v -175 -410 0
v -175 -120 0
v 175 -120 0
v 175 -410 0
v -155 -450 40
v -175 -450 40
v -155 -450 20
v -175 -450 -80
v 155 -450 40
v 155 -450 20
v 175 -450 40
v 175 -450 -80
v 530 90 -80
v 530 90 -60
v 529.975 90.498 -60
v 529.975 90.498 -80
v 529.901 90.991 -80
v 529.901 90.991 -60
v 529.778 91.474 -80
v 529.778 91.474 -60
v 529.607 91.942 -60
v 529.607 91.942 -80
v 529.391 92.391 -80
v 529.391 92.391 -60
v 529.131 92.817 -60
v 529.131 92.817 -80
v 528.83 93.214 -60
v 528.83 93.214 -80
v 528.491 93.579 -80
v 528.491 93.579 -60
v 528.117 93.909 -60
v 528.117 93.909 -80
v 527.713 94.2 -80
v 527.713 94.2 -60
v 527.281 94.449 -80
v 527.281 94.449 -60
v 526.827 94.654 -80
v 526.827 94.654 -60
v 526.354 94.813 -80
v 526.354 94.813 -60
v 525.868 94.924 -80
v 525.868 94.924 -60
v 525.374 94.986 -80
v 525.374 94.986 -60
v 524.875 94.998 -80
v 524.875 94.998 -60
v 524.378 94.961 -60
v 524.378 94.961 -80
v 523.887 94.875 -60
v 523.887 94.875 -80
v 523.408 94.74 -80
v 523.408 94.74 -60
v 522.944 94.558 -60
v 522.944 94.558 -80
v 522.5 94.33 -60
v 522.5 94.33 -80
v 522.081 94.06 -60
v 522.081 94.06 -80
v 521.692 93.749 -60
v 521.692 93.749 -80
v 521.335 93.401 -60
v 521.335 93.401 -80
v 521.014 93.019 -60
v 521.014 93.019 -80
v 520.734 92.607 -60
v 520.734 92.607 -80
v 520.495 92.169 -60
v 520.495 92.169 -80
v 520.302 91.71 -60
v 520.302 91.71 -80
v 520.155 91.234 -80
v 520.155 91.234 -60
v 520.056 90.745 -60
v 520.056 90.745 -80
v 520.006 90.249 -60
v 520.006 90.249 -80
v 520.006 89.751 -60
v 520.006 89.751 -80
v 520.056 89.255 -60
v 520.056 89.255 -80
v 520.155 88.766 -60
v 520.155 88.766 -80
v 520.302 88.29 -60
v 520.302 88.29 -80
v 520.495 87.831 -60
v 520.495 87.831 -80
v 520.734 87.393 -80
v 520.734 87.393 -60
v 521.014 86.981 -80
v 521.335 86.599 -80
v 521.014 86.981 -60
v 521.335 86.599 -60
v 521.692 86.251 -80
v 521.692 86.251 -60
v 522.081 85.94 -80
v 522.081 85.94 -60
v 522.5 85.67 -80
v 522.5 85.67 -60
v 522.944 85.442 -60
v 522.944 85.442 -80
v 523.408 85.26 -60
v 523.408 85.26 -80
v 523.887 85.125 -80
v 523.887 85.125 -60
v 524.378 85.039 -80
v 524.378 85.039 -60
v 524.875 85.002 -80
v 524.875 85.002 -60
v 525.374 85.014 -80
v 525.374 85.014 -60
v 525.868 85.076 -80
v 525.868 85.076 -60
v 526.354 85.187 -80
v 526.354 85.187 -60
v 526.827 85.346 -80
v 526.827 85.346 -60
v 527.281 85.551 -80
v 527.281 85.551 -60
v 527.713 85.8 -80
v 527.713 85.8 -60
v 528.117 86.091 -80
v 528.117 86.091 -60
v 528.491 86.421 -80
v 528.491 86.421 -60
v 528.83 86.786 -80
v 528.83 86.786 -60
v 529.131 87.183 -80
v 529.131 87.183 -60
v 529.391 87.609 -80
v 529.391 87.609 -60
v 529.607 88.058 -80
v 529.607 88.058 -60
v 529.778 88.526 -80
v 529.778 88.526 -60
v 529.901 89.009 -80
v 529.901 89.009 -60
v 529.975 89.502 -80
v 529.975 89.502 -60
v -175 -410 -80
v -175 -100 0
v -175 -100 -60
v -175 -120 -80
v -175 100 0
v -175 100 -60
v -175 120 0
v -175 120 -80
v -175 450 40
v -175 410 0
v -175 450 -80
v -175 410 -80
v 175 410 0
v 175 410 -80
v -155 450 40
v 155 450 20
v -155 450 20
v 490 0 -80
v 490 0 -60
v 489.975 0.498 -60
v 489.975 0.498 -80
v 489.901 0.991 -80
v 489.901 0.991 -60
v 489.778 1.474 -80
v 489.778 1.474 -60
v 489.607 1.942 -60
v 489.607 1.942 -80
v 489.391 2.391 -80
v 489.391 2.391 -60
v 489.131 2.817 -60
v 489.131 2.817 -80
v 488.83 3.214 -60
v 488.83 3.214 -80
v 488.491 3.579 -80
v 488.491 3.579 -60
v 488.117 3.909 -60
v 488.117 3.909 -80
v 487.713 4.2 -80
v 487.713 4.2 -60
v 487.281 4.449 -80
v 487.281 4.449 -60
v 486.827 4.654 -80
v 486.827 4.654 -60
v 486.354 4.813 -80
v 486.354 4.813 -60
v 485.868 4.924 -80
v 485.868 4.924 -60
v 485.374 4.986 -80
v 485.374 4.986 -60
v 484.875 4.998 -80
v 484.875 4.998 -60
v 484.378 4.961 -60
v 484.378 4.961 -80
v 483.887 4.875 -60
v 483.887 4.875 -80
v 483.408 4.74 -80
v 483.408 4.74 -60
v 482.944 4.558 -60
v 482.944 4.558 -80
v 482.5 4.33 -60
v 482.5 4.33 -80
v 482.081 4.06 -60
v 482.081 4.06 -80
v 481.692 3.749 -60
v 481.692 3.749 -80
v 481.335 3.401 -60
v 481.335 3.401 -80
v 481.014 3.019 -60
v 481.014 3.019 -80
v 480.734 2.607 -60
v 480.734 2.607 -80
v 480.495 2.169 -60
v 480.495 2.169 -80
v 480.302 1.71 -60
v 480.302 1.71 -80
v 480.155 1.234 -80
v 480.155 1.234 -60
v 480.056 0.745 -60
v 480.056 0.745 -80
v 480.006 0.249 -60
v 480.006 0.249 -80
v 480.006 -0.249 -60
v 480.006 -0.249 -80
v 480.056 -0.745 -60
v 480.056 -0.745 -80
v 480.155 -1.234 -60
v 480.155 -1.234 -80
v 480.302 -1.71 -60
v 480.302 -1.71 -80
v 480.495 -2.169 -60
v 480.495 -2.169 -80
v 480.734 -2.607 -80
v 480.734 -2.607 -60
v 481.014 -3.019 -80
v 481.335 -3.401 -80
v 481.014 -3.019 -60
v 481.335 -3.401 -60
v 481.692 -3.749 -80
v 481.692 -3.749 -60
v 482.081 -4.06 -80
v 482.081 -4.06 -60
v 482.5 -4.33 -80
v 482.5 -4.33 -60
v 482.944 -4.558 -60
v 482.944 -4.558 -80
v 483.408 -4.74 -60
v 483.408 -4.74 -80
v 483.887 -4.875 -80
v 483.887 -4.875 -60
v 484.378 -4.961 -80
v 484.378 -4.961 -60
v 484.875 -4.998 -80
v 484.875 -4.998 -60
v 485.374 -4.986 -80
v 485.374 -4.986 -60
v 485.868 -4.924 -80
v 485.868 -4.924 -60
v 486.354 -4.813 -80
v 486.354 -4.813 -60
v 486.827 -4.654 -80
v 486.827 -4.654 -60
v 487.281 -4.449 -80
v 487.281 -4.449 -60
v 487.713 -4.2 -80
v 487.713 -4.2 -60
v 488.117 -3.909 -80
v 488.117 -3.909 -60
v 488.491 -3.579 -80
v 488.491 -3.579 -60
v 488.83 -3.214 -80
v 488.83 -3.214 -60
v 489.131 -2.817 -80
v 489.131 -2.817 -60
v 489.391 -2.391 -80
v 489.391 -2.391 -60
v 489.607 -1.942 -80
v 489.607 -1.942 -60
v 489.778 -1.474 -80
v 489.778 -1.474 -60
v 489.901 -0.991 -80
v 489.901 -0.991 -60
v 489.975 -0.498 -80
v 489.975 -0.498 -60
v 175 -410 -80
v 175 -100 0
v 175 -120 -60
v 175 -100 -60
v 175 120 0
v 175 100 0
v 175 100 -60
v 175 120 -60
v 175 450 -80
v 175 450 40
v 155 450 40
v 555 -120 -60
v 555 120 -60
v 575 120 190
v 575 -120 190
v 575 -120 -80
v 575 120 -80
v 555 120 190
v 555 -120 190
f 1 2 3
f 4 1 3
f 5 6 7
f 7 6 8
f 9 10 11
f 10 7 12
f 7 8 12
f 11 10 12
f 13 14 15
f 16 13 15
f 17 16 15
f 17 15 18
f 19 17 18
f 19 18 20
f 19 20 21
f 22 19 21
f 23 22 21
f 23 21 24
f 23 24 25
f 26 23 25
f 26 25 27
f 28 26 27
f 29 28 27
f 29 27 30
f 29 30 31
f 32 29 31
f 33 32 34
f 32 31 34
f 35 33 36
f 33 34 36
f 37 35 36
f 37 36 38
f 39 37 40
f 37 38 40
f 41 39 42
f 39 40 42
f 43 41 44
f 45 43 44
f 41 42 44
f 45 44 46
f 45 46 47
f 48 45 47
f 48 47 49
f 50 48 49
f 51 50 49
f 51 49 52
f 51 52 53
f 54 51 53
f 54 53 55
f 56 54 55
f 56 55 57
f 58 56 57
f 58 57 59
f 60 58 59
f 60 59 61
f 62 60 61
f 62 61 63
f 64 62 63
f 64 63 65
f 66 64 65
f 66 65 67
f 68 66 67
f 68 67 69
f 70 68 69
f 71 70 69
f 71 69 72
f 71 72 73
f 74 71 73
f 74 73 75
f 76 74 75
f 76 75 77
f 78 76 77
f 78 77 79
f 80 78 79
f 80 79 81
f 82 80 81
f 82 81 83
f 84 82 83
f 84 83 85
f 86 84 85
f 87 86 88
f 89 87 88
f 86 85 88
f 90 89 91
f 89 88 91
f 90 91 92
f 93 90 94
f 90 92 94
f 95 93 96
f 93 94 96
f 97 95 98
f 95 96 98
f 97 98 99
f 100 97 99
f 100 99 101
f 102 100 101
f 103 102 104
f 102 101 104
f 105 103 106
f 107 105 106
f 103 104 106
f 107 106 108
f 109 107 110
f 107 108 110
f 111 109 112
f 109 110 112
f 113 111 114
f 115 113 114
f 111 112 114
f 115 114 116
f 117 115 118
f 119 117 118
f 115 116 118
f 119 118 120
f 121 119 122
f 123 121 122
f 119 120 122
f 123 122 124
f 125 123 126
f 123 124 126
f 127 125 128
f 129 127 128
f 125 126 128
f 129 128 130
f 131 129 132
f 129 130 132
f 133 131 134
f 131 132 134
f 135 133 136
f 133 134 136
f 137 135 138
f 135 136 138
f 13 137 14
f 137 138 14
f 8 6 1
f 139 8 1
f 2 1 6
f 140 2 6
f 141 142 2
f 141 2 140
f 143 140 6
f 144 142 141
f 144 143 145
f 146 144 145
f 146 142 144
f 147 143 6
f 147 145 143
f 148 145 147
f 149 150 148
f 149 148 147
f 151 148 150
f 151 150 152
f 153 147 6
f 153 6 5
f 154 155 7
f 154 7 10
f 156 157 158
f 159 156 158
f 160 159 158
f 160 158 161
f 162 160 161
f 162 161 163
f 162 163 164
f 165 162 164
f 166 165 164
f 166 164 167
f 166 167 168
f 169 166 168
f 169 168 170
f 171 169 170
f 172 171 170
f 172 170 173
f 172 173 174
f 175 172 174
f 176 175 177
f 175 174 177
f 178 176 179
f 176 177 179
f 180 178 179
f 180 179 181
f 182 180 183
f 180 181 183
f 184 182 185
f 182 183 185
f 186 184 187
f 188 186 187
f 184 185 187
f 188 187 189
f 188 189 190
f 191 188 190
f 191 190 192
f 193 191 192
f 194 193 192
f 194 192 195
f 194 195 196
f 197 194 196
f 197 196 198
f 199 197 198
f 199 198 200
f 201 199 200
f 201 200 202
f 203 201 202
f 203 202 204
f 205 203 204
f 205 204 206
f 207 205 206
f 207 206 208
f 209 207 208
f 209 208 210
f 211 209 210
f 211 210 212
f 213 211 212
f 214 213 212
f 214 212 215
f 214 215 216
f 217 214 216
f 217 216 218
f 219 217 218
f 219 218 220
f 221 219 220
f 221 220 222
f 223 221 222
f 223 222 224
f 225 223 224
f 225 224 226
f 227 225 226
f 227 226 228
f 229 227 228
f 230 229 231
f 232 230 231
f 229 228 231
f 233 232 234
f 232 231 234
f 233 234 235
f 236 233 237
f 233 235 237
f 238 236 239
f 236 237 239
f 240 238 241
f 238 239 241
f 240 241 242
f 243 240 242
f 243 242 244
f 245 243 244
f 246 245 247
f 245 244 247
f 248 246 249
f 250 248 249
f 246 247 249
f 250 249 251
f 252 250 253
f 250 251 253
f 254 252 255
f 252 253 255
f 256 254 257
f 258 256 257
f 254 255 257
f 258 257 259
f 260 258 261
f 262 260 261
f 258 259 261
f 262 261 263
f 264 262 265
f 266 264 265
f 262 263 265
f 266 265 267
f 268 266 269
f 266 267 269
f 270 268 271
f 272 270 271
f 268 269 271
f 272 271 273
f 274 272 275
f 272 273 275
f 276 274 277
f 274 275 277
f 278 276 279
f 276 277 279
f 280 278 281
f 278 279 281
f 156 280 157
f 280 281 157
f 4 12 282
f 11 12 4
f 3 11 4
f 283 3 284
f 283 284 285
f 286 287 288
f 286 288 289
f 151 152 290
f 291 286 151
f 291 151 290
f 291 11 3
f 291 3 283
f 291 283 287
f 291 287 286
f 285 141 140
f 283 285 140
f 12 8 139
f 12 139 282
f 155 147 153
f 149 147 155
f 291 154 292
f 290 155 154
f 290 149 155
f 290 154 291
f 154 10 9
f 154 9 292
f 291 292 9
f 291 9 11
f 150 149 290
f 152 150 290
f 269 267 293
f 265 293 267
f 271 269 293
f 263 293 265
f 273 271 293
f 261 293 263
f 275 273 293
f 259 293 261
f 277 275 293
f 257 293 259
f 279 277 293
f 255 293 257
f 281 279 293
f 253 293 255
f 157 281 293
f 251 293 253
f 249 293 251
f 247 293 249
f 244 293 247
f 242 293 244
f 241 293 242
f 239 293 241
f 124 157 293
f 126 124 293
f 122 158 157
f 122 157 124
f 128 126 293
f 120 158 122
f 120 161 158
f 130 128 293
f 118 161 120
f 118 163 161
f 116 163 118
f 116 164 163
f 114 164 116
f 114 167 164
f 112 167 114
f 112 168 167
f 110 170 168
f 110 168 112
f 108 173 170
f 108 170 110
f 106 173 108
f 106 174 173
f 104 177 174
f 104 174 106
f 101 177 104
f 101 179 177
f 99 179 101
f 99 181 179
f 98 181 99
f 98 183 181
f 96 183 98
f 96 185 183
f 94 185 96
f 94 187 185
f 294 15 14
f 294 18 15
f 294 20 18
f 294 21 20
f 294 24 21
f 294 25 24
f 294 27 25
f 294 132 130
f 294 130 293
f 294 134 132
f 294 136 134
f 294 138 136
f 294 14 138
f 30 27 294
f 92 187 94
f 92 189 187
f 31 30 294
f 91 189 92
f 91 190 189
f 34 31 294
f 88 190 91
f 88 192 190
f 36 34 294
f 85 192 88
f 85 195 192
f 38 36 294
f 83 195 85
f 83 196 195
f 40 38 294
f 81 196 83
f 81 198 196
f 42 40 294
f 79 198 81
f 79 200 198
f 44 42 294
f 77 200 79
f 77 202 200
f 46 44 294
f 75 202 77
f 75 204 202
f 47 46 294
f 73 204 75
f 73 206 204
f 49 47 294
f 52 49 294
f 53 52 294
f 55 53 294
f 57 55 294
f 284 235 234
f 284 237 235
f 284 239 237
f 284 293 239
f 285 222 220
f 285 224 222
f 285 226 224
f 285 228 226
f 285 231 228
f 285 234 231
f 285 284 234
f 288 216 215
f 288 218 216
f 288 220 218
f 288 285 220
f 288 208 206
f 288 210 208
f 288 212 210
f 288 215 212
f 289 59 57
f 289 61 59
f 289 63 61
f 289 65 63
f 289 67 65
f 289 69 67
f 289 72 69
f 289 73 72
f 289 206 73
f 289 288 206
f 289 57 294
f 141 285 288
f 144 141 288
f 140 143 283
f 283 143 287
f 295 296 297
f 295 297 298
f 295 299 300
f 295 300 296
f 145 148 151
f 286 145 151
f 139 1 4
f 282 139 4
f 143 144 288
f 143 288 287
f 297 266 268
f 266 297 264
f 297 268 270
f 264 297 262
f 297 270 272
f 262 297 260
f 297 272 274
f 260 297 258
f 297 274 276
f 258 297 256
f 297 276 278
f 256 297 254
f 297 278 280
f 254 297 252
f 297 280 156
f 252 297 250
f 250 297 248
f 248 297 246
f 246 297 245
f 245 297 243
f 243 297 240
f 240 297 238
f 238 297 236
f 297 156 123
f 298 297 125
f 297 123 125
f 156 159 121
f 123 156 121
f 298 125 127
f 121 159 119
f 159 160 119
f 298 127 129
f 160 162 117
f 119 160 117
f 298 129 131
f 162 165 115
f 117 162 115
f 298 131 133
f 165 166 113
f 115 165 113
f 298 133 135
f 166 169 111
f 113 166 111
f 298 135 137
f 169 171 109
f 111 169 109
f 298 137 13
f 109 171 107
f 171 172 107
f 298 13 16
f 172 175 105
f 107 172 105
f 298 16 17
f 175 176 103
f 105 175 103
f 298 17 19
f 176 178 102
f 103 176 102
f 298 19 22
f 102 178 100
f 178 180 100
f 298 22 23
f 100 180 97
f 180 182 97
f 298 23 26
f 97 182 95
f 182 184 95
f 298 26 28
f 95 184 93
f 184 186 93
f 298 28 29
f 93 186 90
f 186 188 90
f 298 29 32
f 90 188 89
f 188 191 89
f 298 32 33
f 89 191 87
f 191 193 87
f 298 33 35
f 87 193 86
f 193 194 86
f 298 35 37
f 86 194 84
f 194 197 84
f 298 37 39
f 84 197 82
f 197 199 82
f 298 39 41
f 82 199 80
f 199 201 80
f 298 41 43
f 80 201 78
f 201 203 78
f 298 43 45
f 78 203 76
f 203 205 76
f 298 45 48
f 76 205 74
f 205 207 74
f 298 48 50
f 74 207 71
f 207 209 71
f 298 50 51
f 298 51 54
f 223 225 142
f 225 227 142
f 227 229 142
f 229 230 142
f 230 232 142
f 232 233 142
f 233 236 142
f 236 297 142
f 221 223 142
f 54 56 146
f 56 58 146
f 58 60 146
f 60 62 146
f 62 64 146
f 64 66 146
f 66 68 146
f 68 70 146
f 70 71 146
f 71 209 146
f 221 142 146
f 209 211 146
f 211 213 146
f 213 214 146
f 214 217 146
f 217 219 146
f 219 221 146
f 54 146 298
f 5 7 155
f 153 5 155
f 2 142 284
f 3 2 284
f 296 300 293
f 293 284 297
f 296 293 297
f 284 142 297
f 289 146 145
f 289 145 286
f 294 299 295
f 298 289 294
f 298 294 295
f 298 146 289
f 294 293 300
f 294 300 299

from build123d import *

# Parameters (mm, degrees)
F0_W      = 350
F0_H      = 900
F1_DEPTH  = 20
F2_W      = 100
F2_H      = 20
F3_DEPTH  = 175
F4_W      = 350
F4_H      = 40
F5_DEPTH  = 80
F6_W      = 20
F6_H      = 900
F7_DEPTH  = 20
F8_W      = 240
F8_H      = 20
F9_DEPTH  = 400
F10_W     = 20
F10_H     = 240
F11_DEPTH = 250
F12_R     = 5
F13_DEPTH = 20.001


# Not quite as in the source:
# - a pattern or mirror of a feature is missing from the dataset's text; its kind, count and spacing are read off the source's solid


with BuildPart() as f1:
    # F0 (on Top) → F1 (new body)
    with BuildSketch(Plane.XY):
        Rectangle(F0_W, F0_H)
    extrude(amount=F1_DEPTH)

    # F2 (on Right) → F3 (join, symmetric)
    with BuildSketch(Plane.YZ):
        Polygon((-100, 0), (-120, 0), (-120, -80), (-100, -80), (-100, -60), align=None)
        with Locations((-50, -70)):
            Rectangle(F2_W, F2_H)
    f3 = extrude(amount=F3_DEPTH, both=True)

    # F3_copies: F3 across plane
    add(f3.mirror(Plane.ZX))

    # F4 (on face) → F5 (join)
    with BuildSketch(Plane(origin=(0, 0, 0), x_dir=(1, 0, 0), z_dir=(0, 0, -1))):
        with Locations((0, 430)):
            Rectangle(F4_W, F4_H)
    f5 = extrude(amount=F5_DEPTH)

    # F5_copies: F5 across plane
    add(f5.mirror(Plane.ZX))

    # F6 (on face) → F7 (join)
    with BuildSketch(Plane.XY.offset(20)):
        with Locations((-165, 0)):
            Rectangle(F6_W, F6_H)
        with Locations((165, 0)):
            Rectangle(F6_W, F6_H)
    extrude(amount=F7_DEPTH)

    # F8 (on face) → F9 (join)
    with BuildSketch(Plane.YZ.offset(175)):
        with Locations((0, -70)):
            Rectangle(F8_W, F8_H)
    extrude(amount=F9_DEPTH)

    # F10 (on face) → F11 (join)
    with BuildSketch(Plane.XY.offset(-60)):
        with Locations((565, 0)):
            Rectangle(F10_W, F10_H)
    extrude(amount=F11_DEPTH)

    # F12 (on face) → F13 (cut, through all)
    with BuildSketch(Plane.XY.offset(-60)):
        with Locations((525, 90)):
            Circle(F12_R)
        with Locations((485, 0)):
            Circle(F12_R)
    extrude(amount=-F13_DEPTH, mode=Mode.SUBTRACT)


solid = f1.part
